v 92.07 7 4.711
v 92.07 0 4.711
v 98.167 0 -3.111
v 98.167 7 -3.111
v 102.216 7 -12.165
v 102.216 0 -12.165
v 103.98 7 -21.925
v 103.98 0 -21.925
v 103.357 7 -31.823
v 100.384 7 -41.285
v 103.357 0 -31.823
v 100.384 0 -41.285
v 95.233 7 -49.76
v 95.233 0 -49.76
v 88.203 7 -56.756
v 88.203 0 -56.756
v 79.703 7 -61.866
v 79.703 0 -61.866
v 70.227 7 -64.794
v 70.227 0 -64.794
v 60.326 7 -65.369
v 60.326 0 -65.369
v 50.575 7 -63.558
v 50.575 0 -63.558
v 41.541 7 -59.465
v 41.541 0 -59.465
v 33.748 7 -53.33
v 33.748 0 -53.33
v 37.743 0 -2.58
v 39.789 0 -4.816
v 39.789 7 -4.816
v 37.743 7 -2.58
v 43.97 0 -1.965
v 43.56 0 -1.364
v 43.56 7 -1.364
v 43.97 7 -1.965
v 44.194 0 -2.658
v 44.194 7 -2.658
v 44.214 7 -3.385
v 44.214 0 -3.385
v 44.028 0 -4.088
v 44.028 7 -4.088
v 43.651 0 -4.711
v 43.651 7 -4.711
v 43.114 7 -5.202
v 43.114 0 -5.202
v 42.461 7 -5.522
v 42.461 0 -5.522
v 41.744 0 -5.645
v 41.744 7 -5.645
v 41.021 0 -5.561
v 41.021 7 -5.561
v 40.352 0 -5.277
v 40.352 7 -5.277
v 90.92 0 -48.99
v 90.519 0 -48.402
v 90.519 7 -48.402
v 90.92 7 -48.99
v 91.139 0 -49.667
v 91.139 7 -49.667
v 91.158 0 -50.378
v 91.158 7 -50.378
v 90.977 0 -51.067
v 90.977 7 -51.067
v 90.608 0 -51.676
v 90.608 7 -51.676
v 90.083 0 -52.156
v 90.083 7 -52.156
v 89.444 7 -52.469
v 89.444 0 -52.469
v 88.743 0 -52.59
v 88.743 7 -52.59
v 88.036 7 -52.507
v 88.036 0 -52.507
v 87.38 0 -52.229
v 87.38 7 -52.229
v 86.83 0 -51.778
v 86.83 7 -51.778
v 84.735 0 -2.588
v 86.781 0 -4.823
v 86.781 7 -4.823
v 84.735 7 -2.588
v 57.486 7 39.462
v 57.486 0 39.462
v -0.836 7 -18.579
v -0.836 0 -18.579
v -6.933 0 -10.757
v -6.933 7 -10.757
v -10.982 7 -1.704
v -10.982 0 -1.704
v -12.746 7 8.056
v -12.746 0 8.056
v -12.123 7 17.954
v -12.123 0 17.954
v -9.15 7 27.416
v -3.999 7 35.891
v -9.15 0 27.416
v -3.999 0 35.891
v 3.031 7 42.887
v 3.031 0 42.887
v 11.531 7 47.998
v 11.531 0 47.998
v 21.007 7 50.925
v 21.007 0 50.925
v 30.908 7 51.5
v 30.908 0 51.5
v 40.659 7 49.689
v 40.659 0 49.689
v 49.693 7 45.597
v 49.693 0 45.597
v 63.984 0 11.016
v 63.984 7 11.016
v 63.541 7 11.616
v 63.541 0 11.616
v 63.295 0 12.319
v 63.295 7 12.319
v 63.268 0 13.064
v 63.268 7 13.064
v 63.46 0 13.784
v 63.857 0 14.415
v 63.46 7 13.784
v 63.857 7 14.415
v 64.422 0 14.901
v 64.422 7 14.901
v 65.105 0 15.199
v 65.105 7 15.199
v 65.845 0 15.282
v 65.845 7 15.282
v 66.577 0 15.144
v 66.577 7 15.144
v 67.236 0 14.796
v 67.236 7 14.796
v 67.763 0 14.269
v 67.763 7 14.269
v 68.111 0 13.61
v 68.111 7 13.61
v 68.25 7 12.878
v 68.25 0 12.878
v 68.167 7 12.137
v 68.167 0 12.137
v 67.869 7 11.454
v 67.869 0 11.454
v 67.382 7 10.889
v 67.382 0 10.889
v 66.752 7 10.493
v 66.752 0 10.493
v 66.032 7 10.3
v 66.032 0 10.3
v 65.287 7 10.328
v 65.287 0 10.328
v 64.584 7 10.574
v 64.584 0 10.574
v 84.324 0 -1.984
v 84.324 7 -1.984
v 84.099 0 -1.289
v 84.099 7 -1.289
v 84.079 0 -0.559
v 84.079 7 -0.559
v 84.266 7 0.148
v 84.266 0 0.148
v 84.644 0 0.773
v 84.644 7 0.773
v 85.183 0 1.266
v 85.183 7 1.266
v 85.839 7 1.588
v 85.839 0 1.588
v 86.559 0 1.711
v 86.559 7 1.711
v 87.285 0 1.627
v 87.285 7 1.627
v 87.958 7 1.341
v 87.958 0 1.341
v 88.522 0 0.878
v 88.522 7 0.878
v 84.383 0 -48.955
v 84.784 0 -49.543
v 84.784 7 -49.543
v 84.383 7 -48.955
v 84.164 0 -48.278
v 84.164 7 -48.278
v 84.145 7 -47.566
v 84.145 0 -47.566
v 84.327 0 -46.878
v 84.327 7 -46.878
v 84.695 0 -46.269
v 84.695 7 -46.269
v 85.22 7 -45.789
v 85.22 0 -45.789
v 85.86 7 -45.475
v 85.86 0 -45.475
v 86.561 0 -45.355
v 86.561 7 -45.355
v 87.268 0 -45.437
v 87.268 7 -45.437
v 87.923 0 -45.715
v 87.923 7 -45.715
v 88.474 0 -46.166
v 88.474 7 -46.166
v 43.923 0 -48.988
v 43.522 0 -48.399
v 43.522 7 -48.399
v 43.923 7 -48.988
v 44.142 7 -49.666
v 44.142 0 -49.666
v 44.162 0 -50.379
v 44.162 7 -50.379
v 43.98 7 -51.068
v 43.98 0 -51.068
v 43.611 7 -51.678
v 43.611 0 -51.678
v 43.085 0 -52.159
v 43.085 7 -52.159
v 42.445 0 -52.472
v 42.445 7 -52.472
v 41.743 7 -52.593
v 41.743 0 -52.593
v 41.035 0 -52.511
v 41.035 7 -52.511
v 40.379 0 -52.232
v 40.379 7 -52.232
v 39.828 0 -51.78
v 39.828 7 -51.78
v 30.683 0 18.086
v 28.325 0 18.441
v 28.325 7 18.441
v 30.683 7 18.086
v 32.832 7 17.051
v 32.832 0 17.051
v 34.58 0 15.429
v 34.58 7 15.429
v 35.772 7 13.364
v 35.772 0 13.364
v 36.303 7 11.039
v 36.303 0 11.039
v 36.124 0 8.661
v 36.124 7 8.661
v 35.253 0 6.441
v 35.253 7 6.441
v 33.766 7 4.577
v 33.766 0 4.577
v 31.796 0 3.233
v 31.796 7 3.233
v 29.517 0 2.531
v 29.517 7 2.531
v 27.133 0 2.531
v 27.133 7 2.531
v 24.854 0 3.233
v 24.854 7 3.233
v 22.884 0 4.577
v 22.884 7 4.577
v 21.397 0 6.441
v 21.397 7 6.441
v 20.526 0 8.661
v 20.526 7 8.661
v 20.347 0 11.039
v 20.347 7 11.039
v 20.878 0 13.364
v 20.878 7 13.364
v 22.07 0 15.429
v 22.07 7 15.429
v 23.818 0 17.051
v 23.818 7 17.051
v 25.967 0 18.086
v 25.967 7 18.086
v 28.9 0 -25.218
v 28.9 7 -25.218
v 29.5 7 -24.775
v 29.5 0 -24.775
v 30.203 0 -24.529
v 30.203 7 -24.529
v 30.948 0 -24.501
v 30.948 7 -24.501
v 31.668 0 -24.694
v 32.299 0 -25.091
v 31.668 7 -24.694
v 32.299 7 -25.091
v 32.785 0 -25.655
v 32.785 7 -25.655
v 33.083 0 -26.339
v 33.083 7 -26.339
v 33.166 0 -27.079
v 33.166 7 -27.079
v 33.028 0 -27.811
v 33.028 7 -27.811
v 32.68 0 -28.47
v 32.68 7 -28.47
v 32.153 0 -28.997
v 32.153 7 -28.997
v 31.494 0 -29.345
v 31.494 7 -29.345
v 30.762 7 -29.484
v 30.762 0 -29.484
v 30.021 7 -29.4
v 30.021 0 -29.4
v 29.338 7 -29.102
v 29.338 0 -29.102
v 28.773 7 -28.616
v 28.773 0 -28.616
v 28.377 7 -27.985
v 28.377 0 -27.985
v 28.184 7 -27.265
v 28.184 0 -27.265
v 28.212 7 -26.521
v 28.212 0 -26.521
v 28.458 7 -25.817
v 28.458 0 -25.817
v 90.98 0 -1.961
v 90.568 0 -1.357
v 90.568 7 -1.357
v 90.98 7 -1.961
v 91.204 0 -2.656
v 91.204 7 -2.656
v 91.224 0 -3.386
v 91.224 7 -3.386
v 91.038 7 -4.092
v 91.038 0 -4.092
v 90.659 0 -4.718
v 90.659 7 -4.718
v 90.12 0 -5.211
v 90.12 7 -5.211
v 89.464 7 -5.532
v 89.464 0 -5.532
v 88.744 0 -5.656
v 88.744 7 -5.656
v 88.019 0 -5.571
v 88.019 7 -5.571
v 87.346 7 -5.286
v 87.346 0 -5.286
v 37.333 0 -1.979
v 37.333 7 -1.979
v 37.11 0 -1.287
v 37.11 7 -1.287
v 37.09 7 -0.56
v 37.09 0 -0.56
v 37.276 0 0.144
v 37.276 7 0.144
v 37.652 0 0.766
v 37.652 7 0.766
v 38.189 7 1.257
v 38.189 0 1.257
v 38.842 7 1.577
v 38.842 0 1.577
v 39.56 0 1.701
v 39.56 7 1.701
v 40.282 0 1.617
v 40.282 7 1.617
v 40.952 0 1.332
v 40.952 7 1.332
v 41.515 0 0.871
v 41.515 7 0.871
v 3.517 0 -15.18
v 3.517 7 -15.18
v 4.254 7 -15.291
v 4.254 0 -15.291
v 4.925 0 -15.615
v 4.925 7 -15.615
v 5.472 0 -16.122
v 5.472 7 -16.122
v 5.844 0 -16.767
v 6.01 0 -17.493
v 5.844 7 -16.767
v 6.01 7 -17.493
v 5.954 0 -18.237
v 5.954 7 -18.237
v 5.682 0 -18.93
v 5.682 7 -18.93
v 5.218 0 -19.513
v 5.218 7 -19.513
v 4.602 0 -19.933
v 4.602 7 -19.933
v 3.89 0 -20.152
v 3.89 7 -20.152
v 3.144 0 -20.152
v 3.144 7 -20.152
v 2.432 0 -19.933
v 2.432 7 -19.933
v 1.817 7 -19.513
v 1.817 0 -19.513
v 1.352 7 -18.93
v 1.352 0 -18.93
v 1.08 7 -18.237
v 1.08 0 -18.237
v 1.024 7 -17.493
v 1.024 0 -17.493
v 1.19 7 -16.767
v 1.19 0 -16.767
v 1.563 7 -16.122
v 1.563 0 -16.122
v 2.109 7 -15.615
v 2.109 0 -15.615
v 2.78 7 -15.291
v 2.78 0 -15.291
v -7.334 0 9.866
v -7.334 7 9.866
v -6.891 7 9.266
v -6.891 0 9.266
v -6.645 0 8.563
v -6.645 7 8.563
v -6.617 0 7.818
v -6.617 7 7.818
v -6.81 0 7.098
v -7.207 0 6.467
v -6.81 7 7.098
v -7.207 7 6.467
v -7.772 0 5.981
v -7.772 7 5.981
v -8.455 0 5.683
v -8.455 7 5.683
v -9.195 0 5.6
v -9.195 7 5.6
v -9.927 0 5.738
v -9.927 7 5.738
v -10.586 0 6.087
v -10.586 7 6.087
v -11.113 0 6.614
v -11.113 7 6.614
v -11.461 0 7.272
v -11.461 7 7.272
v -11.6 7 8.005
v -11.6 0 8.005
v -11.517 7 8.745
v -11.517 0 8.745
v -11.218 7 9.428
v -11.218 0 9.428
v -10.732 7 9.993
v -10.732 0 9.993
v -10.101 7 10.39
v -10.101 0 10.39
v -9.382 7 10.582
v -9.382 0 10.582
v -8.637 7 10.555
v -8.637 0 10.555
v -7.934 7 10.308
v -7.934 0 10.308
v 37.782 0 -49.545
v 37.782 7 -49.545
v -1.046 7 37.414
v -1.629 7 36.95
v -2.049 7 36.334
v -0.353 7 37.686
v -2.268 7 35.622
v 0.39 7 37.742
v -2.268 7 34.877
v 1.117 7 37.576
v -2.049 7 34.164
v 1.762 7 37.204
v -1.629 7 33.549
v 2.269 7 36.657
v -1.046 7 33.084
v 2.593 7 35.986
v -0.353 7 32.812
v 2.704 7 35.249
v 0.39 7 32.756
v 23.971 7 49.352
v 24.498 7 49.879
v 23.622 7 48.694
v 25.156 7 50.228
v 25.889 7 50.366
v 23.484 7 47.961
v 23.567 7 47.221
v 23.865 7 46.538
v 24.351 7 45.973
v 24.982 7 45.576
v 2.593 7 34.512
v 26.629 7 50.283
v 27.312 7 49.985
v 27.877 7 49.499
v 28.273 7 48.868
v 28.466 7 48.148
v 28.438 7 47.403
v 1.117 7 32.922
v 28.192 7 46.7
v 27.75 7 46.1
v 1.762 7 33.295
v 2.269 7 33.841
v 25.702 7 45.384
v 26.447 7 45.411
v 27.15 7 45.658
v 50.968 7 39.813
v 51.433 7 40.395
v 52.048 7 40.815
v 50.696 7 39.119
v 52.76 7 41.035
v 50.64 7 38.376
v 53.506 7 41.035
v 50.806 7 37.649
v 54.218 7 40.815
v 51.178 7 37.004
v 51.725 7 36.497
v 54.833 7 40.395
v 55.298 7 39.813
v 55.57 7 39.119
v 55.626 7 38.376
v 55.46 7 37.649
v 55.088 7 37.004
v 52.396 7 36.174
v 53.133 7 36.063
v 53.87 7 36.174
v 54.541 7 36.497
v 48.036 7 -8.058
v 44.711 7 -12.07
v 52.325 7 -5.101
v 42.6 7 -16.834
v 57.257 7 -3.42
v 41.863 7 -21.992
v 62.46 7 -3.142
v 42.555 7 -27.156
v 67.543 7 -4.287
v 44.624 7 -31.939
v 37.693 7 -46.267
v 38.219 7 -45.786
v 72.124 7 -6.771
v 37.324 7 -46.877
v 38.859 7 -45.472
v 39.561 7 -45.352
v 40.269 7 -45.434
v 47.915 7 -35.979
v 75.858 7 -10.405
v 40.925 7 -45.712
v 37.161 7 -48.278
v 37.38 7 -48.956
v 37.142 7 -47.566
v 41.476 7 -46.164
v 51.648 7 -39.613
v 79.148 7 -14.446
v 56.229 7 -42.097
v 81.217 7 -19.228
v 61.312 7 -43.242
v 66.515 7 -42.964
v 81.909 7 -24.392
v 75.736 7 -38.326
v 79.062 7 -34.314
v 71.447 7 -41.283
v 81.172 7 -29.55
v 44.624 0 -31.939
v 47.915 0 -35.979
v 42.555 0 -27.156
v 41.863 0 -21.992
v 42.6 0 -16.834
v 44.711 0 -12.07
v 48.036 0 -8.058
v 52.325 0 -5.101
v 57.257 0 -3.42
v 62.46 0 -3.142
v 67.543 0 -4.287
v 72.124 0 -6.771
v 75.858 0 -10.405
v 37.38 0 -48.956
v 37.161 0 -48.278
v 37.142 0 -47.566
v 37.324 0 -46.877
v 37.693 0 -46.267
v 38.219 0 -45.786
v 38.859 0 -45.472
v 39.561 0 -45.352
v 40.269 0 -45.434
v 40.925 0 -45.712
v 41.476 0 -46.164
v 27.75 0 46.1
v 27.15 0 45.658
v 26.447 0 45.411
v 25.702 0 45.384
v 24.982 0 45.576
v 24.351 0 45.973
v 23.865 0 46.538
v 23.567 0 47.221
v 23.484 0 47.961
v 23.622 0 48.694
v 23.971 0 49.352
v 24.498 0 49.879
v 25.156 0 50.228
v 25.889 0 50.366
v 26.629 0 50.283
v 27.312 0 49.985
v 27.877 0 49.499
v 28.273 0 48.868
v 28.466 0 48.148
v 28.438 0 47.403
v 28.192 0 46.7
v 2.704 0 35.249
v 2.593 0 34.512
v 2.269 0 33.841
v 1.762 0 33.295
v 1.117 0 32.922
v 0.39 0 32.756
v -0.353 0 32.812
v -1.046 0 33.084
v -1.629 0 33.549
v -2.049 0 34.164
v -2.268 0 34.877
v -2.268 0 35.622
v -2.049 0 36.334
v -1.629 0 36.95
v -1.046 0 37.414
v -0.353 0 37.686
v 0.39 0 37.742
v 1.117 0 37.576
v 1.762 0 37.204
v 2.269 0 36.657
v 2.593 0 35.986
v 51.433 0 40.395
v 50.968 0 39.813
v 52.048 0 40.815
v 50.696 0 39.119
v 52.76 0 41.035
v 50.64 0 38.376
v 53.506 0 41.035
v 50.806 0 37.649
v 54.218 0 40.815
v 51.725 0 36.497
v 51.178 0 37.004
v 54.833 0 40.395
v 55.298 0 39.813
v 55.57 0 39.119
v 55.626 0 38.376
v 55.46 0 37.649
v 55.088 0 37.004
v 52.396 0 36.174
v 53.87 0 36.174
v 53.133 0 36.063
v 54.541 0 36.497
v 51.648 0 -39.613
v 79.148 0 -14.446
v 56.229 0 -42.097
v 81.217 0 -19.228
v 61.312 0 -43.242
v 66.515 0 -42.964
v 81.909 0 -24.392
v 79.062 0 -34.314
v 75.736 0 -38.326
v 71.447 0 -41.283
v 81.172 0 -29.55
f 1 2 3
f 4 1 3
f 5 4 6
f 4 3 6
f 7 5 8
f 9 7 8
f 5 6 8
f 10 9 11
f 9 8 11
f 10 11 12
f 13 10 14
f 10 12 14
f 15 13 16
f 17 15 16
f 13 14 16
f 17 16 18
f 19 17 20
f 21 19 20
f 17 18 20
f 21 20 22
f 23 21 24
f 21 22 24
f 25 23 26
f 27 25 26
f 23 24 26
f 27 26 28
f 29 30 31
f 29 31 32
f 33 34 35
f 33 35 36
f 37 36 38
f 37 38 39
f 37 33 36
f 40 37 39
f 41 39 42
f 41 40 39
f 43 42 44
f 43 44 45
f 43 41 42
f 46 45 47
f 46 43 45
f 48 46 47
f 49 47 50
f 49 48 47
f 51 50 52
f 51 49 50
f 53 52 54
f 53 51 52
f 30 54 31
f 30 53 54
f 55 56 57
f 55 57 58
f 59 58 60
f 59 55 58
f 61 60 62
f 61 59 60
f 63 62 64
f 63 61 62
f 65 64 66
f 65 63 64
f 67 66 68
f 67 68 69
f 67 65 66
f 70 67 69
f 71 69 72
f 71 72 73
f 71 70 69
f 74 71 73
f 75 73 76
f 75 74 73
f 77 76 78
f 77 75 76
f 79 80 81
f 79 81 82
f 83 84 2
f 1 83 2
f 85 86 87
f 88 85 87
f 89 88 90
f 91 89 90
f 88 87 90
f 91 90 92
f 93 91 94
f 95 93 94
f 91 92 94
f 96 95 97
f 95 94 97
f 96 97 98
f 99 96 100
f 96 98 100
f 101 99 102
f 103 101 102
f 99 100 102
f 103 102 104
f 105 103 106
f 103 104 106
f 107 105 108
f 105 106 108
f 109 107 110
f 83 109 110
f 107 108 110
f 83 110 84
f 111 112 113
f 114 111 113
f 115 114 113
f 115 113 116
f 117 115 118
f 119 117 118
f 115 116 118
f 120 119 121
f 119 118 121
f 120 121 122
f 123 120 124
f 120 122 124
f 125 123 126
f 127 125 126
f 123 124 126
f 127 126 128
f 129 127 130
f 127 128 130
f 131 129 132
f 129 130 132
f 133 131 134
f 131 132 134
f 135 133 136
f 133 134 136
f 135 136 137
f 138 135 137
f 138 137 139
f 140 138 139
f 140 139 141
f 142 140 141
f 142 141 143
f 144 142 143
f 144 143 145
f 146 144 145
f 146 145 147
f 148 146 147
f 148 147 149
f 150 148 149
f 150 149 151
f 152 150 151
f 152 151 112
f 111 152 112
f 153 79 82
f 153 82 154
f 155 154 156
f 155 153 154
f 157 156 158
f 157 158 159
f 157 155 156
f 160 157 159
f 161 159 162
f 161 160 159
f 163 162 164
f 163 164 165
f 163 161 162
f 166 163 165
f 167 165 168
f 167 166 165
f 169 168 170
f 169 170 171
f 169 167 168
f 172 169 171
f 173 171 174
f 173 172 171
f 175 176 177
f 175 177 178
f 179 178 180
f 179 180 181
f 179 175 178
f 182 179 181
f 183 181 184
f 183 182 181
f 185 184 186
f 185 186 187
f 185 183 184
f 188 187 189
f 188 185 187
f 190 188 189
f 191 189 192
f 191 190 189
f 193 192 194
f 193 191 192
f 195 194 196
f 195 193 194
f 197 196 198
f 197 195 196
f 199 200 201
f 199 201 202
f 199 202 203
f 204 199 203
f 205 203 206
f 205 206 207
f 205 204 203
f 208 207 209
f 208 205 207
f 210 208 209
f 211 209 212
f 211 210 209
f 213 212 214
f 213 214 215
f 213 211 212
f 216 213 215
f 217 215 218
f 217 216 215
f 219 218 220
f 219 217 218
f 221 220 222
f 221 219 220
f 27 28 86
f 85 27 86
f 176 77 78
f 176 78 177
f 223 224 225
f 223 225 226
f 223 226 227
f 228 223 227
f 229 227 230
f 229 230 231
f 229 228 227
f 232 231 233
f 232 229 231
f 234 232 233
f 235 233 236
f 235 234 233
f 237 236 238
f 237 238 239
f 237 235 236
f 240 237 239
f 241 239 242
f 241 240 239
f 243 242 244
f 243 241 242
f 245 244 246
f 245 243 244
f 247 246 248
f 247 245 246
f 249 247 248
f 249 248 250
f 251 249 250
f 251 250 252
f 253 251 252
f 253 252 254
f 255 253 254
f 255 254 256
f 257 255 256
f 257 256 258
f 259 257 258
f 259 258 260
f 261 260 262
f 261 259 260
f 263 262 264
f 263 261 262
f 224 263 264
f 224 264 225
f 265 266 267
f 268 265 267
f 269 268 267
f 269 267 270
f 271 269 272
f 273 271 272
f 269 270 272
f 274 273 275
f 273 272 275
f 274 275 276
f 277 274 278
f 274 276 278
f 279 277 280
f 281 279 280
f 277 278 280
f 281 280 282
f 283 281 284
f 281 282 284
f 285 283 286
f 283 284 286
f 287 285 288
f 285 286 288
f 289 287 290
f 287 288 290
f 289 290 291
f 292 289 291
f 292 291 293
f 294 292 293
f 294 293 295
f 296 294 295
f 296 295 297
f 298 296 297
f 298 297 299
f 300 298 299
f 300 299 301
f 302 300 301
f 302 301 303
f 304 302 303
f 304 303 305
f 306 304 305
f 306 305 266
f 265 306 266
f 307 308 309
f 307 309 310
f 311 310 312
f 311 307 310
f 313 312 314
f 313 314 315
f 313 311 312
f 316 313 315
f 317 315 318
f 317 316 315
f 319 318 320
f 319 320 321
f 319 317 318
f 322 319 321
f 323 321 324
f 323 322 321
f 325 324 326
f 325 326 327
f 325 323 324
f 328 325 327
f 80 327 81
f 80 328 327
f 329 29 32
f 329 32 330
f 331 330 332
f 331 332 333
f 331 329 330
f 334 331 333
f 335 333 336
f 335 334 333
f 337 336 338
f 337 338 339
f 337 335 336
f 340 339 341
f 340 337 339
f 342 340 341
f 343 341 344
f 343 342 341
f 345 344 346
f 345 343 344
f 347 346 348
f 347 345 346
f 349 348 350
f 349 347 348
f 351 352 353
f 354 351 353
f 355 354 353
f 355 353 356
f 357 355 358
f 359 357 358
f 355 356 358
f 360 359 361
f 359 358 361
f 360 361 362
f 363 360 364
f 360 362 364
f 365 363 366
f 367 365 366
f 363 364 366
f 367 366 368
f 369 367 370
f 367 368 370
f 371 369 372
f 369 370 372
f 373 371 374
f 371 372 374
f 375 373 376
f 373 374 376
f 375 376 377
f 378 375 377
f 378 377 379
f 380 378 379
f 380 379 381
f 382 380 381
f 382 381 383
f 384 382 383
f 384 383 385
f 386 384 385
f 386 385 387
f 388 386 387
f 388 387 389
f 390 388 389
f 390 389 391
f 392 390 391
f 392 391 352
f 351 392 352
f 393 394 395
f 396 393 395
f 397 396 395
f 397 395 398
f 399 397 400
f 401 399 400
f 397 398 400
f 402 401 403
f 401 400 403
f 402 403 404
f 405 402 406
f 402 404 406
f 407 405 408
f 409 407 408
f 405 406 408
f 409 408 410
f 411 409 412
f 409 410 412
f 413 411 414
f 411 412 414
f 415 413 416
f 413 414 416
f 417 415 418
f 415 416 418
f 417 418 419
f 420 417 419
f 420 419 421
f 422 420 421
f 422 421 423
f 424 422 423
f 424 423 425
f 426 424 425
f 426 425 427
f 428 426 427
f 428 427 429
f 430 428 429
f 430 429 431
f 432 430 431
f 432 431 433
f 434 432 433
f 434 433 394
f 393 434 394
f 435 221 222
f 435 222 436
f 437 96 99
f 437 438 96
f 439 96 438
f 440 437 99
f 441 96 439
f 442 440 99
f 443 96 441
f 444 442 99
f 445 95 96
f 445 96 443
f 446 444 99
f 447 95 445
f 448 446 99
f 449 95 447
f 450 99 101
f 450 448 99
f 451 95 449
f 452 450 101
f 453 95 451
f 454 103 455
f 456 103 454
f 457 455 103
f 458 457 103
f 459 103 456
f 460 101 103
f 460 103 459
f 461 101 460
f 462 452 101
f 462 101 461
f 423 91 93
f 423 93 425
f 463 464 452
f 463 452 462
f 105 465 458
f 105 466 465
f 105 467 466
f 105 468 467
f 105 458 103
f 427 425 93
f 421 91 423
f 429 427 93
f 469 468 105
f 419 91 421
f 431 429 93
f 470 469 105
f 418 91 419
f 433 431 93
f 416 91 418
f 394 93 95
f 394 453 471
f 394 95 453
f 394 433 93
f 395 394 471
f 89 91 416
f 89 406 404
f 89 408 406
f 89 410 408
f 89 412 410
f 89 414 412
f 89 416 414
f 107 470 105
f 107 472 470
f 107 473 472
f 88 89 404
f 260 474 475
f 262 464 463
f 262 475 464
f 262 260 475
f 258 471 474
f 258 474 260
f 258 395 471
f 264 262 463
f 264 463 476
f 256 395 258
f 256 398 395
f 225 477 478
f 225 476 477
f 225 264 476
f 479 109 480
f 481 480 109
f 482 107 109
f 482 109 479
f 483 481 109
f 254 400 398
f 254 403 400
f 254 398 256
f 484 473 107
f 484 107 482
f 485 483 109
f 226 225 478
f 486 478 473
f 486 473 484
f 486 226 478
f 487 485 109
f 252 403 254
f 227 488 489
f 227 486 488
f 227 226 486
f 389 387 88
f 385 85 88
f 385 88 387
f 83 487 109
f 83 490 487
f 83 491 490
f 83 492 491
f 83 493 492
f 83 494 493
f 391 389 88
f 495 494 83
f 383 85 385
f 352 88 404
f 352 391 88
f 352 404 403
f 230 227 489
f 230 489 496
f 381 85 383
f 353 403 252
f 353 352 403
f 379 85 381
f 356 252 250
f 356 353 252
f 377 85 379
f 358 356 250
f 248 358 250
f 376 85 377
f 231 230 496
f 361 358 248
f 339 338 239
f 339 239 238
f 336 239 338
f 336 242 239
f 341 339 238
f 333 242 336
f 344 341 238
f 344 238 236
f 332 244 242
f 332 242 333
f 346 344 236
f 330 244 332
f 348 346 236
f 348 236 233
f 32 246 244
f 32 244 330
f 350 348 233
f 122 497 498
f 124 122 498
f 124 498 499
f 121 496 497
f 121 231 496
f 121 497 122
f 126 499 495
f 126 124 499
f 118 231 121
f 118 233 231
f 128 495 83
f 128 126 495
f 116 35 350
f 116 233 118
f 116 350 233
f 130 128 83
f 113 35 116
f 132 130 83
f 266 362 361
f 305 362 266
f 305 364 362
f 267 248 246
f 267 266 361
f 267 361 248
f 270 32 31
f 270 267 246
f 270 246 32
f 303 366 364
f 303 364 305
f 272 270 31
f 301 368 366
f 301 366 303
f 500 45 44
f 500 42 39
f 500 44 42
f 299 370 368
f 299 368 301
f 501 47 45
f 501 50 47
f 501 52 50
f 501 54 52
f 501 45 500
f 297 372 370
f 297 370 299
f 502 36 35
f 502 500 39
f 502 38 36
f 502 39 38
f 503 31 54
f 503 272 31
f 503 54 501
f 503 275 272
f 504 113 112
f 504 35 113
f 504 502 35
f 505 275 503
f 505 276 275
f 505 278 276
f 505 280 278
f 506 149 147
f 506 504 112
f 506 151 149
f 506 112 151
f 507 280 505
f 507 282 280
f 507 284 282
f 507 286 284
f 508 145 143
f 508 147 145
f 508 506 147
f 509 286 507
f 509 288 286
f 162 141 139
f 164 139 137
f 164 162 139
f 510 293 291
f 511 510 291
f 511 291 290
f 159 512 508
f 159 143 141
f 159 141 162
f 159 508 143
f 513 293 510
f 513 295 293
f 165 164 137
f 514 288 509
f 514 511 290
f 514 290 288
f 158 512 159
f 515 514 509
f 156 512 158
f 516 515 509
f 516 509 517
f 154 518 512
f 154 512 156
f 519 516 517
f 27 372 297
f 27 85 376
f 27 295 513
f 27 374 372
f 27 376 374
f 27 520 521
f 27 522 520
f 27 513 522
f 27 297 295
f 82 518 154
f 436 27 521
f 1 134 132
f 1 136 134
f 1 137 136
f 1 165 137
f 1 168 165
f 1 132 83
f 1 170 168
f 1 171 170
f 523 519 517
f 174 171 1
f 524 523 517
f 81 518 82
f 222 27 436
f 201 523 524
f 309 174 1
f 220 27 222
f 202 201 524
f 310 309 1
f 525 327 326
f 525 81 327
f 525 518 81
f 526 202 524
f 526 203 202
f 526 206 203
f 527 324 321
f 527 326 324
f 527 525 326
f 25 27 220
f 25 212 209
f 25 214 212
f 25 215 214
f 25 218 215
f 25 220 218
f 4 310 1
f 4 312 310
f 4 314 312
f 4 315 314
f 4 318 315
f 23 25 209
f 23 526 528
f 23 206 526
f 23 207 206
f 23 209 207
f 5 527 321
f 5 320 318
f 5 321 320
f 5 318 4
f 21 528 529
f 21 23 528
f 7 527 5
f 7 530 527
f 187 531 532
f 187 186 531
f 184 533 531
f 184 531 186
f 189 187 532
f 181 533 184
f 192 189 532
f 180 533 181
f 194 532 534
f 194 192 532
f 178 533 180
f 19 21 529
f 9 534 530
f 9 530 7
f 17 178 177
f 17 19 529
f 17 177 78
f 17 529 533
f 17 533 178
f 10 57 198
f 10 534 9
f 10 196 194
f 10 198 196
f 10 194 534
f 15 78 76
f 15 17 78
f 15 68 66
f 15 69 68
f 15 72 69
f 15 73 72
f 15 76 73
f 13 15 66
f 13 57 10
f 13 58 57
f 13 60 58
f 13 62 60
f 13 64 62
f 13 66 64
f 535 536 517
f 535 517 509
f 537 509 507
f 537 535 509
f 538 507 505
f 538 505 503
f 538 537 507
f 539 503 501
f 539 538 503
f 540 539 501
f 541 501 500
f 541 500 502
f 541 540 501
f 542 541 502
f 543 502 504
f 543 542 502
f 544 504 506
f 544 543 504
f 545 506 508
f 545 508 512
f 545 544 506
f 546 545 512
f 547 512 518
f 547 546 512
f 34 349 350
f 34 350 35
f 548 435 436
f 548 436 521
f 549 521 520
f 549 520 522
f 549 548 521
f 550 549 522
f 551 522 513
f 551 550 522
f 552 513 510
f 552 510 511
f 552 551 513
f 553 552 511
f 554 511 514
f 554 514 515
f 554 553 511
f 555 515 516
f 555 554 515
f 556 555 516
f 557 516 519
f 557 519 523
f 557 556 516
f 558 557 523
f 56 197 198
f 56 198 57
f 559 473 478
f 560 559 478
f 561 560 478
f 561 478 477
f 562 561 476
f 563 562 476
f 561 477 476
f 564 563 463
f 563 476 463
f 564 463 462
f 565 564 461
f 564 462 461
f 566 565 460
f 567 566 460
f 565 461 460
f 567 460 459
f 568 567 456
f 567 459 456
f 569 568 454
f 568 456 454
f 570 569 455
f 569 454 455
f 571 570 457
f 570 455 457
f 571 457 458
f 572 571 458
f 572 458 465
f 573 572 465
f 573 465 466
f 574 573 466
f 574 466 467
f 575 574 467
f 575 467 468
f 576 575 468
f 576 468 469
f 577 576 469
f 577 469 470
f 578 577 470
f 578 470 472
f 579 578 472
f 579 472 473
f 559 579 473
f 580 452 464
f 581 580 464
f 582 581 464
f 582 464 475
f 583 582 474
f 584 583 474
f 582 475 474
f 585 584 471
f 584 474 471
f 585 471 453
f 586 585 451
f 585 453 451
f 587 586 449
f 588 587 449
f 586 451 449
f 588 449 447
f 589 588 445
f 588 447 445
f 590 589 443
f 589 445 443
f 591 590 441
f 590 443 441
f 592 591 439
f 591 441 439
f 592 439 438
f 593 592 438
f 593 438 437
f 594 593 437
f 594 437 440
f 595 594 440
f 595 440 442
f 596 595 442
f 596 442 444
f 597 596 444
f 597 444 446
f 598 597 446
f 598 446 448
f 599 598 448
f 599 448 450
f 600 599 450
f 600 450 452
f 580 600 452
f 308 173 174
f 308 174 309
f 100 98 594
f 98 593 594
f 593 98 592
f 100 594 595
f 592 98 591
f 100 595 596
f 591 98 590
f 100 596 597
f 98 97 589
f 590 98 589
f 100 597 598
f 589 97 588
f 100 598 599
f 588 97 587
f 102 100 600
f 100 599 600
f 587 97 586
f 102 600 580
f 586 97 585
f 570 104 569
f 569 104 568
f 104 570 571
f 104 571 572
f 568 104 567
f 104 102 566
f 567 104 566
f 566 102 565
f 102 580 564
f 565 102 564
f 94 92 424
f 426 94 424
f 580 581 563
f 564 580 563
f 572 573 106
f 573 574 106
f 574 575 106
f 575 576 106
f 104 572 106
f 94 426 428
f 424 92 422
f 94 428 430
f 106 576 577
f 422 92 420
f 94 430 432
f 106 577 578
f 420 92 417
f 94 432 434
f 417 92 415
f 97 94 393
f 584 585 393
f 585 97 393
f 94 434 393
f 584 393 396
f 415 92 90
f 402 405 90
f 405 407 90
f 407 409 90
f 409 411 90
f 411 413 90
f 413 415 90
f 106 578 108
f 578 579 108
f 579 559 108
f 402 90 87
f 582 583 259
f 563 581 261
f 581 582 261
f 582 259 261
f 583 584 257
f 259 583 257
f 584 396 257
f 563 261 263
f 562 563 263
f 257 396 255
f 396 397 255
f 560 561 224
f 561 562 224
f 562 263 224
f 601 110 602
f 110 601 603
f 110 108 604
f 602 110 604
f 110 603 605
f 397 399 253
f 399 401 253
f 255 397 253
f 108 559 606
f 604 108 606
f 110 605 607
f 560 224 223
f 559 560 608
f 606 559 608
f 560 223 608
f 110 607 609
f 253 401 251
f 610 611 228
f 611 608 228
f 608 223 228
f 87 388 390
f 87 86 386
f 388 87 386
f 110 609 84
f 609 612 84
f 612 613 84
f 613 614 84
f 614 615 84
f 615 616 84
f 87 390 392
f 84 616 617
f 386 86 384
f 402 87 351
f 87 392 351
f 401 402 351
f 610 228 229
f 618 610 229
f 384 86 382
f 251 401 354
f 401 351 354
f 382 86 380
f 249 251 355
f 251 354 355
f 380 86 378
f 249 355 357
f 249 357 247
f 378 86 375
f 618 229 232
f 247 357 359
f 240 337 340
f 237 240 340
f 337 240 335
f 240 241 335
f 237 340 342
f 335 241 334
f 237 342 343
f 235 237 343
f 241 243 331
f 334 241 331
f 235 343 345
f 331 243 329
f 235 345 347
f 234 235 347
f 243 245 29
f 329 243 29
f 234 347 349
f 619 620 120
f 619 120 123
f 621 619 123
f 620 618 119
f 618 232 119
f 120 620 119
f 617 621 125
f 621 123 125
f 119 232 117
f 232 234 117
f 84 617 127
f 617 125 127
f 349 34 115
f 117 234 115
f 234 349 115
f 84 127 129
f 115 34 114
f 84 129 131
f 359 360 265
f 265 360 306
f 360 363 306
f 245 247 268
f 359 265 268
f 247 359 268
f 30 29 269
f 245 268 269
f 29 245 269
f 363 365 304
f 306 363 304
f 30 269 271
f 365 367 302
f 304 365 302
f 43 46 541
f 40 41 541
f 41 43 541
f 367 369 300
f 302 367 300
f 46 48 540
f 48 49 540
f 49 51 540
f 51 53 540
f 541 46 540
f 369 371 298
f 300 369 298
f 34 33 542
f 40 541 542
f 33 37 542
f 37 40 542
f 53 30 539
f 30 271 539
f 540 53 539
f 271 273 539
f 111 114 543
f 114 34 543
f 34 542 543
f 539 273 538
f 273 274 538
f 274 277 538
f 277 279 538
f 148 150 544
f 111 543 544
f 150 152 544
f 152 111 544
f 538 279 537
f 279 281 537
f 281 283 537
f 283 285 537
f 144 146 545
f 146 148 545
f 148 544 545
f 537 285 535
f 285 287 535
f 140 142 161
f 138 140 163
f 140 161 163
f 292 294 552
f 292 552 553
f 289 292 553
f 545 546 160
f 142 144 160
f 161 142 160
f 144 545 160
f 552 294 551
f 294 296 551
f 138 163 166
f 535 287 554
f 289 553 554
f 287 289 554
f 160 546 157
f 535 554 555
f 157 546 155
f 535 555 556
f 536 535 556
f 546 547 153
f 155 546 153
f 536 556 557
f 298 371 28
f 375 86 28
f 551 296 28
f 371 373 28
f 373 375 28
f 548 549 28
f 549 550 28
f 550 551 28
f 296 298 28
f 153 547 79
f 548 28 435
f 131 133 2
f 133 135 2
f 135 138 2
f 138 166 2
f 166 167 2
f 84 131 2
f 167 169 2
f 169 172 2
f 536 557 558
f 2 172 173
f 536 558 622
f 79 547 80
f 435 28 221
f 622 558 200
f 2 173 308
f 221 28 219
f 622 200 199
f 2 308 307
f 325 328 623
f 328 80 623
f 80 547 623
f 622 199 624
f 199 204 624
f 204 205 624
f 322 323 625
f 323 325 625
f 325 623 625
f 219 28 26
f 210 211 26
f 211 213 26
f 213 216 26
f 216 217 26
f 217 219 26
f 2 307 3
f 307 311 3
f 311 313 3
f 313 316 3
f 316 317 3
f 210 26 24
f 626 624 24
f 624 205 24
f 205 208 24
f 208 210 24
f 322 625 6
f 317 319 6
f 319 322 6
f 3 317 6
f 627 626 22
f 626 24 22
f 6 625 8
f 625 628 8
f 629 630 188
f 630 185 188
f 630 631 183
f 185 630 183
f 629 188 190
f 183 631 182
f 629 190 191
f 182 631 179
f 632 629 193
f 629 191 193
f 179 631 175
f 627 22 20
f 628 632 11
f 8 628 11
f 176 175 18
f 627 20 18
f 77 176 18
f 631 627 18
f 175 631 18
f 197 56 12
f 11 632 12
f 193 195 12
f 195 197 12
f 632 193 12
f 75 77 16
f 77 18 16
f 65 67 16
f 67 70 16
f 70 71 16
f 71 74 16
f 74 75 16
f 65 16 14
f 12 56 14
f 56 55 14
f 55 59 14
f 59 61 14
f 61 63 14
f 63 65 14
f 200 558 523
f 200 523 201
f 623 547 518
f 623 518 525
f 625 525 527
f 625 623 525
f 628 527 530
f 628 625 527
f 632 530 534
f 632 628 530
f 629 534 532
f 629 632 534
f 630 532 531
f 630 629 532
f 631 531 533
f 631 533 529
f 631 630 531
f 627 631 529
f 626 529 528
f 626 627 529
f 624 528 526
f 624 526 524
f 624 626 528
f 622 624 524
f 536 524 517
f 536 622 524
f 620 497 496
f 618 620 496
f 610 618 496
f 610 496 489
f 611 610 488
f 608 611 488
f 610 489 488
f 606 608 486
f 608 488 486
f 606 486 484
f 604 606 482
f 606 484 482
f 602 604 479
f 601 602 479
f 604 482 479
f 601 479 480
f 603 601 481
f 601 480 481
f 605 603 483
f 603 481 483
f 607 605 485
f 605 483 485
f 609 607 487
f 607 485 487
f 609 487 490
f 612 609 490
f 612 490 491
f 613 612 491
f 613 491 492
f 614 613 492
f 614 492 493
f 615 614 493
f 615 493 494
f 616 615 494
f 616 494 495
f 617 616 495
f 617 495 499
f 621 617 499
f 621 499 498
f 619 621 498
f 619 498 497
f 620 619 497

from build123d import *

# Parameters (mm, degrees)
SKETCH2_R           = 8
BOSS_EXTRUDE1_DEPTH = 7
SKETCH6_R           = 2.5
CUT_EXTRUDE2_DEPTH  = 10
CIRPATTERN1_COUNT   = 8


with BuildPart() as part:
    # Sketch2 → Boss-Extrude1 (new body)
    with BuildSketch(Plane(origin=(0, 0, 0), x_dir=(1, 0, 0), z_dir=(0, 1, 0))):
        with BuildLine():
            Line((57.48567214, -39.461643712), (92.069504062, -4.710791287))
            ThreePointArc((92.069504062, -4.710791287), (91.929351462, 53.470307056), (33.748253119, 53.330154455))
            Line((33.748253119, 53.330154455), (-0.835578803, 18.579302031))
            ThreePointArc((-0.835578803, 18.579302031), (-0.695426202, -39.601796312), (57.48567214, -39.461643712))
        make_face()
        with Locations(Location((28.325046669, -10.441170841, 0), (0, 0, 270))):
            Circle(SKETCH2_R, mode=Mode.SUBTRACT)
        with BuildLine():
            ThreePointArc((75.857560085, 10.405306461), (75.736496811, 38.325822665), (47.914533773, 35.978855656))
            ThreePointArc((47.914533773, 35.978855656), (48.035597047, 8.058339452), (75.857560085, 10.405306461))
        make_face(mode=Mode.SUBTRACT)
        with BuildLine():
            ThreePointArc((43.521692021, 48.399463186), (43.365065843, 51.936993301), (39.827535728, 51.780367124))
            Line((39.827535728, 51.780367124), (37.781872405, 49.545166072))
            ThreePointArc((37.781872405, 49.545166072), (37.938498583, 46.007635957), (41.476028698, 46.164262134))
            Line((41.476028698, 46.164262134), (43.521692021, 48.399463186))
        make_face(mode=Mode.SUBTRACT)
        with BuildLine():
            ThreePointArc((90.519256192, 48.401692465), (90.362836565, 51.934557472), (86.829971557, 51.778137845))
            Line((86.829971557, 51.778137845), (84.784308234, 49.542936793))
            ThreePointArc((84.784308234, 49.542936793), (84.940727861, 46.010071786), (88.473592869, 46.166491413))
            Line((88.473592869, 46.166491413), (90.519256192, 48.401692465))
        make_face(mode=Mode.SUBTRACT)
        with BuildLine():
            ThreePointArc((43.560284925, 1.364142834), (43.400386196, 4.975586205), (39.788942825, 4.815687476))
            Line((39.788942825, 4.815687476), (37.743279502, 2.580486424))
            ThreePointArc((37.743279502, 2.580486424), (37.903178231, -1.030956947), (41.514621602, -0.871058218))
            Line((41.514621602, -0.871058218), (43.560284925, 1.364142834))
        make_face(mode=Mode.SUBTRACT)
        with BuildLine():
            ThreePointArc((90.568112992, 1.356978562), (90.407550468, 4.983414272), (86.781114757, 4.822851748))
            Line((86.781114757, 4.822851748), (84.735451434, 2.587650696))
            ThreePointArc((84.735451434, 2.587650696), (84.896013958, -1.038785014), (88.522449669, -0.87822249))
            Line((88.522449669, -0.87822249), (90.568112992, 1.356978562))
        make_face(mode=Mode.SUBTRACT)
    extrude(amount=BOSS_EXTRUDE1_DEPTH)

    # Sketch6 → Cut-Extrude2 (cut)
    with BuildSketch(Plane(origin=(0, 7, 0), x_dir=(1, 0, 0), z_dir=(0, 1, 0))):
        with Locations(Location((3.517083482, 17.6802616, 0), (0, 0, 270))):
            Circle(SKETCH6_R)
    cut_extrude2 = extrude(amount=-CUT_EXTRUDE2_DEPTH, mode=Mode.SUBTRACT)

    # CirPattern1: Cut-Extrude2 ×8 about axis
    cirpattern1_axis = Axis((28.325046669, 0, 10.441170841), (0, 1, 0))
    for i in range(1, CIRPATTERN1_COUNT):
        add(cut_extrude2.rotate(cirpattern1_axis, i * 360 / CIRPATTERN1_COUNT), mode=Mode.SUBTRACT)


solid = part.part
